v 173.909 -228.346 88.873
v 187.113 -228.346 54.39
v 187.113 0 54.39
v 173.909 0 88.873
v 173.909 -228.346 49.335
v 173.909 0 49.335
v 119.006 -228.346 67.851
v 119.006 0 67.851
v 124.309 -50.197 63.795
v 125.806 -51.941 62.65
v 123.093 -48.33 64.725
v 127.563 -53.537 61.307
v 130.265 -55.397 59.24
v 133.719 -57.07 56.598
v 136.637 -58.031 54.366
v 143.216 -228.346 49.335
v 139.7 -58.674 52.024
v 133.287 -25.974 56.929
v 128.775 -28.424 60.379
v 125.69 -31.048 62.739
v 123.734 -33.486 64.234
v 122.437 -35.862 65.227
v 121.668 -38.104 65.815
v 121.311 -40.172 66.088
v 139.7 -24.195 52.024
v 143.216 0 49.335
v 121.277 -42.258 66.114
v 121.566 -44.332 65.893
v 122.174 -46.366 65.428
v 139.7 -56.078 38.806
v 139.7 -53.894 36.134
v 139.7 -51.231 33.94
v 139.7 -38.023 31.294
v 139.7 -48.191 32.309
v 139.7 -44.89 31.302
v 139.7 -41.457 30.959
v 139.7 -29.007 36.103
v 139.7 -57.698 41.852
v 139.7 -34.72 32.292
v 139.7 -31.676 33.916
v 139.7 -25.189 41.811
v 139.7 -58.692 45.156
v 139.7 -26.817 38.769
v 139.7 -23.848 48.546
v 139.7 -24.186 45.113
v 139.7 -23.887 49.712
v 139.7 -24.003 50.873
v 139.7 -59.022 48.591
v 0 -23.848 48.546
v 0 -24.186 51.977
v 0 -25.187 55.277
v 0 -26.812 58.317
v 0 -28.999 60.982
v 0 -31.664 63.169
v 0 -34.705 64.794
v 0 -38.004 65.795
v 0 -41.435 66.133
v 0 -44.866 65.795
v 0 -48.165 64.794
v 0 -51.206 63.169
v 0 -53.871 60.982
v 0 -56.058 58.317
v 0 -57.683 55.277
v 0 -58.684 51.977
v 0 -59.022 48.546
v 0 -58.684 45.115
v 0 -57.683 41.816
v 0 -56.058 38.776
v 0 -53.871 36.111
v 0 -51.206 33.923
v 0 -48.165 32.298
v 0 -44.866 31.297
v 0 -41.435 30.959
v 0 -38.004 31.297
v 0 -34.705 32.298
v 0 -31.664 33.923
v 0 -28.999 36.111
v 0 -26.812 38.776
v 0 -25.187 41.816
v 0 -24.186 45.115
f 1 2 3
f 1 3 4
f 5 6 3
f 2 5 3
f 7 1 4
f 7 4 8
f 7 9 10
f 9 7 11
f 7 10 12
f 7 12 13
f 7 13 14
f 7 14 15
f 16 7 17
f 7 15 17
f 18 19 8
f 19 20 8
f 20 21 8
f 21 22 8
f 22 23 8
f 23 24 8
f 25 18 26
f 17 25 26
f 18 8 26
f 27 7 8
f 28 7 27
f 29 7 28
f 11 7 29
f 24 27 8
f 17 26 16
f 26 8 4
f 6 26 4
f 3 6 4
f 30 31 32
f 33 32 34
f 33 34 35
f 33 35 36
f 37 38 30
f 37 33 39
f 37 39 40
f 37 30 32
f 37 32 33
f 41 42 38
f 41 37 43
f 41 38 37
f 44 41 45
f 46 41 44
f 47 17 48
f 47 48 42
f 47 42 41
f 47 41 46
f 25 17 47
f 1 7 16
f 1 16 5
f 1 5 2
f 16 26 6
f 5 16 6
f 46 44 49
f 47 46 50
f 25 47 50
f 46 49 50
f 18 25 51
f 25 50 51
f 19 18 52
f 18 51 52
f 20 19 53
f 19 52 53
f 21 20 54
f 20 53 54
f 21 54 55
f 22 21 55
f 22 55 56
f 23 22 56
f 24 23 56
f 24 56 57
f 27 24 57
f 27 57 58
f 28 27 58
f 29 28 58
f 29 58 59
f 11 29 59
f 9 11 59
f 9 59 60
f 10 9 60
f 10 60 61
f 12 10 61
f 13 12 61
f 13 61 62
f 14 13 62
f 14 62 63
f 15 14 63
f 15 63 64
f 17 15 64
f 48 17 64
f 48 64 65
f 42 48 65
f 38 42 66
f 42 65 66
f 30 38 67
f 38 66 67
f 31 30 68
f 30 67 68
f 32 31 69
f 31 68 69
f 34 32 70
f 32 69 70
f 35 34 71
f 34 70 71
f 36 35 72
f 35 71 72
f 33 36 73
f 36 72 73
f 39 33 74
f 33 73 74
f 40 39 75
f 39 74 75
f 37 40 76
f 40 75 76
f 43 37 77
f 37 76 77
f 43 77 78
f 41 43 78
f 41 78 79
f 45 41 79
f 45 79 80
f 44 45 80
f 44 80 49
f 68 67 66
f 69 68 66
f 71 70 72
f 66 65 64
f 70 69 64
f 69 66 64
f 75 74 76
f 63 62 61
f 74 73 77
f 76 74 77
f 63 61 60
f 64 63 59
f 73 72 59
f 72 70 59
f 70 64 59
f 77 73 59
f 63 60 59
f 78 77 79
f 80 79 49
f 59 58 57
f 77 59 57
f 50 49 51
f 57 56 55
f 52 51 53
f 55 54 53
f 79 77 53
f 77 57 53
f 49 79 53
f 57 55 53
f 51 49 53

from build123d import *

# Parameters (mm, degrees)
F1_R     = 17.586867
F2_DEPTH = 139.7
F3_DEPTH = 228.346


with BuildPart() as f2:
    # F1 (on Right) → F2 (new body)
    with BuildSketch(Plane.YZ):
        with Locations((-41.434839, 48.546314)):
            Circle(F1_R)
    extrude(amount=F2_DEPTH)

    # F0 (on Front) → F3 (join)
    with BuildSketch(Plane.XZ):
        Polygon((173.909366, 88.873066), (119.005956, 67.850798), (143.216059, 49.334605), (173.909366, 49.334605), (187.112732, 54.390115), align=None)
    extrude(amount=F3_DEPTH)


solid = f2.part
